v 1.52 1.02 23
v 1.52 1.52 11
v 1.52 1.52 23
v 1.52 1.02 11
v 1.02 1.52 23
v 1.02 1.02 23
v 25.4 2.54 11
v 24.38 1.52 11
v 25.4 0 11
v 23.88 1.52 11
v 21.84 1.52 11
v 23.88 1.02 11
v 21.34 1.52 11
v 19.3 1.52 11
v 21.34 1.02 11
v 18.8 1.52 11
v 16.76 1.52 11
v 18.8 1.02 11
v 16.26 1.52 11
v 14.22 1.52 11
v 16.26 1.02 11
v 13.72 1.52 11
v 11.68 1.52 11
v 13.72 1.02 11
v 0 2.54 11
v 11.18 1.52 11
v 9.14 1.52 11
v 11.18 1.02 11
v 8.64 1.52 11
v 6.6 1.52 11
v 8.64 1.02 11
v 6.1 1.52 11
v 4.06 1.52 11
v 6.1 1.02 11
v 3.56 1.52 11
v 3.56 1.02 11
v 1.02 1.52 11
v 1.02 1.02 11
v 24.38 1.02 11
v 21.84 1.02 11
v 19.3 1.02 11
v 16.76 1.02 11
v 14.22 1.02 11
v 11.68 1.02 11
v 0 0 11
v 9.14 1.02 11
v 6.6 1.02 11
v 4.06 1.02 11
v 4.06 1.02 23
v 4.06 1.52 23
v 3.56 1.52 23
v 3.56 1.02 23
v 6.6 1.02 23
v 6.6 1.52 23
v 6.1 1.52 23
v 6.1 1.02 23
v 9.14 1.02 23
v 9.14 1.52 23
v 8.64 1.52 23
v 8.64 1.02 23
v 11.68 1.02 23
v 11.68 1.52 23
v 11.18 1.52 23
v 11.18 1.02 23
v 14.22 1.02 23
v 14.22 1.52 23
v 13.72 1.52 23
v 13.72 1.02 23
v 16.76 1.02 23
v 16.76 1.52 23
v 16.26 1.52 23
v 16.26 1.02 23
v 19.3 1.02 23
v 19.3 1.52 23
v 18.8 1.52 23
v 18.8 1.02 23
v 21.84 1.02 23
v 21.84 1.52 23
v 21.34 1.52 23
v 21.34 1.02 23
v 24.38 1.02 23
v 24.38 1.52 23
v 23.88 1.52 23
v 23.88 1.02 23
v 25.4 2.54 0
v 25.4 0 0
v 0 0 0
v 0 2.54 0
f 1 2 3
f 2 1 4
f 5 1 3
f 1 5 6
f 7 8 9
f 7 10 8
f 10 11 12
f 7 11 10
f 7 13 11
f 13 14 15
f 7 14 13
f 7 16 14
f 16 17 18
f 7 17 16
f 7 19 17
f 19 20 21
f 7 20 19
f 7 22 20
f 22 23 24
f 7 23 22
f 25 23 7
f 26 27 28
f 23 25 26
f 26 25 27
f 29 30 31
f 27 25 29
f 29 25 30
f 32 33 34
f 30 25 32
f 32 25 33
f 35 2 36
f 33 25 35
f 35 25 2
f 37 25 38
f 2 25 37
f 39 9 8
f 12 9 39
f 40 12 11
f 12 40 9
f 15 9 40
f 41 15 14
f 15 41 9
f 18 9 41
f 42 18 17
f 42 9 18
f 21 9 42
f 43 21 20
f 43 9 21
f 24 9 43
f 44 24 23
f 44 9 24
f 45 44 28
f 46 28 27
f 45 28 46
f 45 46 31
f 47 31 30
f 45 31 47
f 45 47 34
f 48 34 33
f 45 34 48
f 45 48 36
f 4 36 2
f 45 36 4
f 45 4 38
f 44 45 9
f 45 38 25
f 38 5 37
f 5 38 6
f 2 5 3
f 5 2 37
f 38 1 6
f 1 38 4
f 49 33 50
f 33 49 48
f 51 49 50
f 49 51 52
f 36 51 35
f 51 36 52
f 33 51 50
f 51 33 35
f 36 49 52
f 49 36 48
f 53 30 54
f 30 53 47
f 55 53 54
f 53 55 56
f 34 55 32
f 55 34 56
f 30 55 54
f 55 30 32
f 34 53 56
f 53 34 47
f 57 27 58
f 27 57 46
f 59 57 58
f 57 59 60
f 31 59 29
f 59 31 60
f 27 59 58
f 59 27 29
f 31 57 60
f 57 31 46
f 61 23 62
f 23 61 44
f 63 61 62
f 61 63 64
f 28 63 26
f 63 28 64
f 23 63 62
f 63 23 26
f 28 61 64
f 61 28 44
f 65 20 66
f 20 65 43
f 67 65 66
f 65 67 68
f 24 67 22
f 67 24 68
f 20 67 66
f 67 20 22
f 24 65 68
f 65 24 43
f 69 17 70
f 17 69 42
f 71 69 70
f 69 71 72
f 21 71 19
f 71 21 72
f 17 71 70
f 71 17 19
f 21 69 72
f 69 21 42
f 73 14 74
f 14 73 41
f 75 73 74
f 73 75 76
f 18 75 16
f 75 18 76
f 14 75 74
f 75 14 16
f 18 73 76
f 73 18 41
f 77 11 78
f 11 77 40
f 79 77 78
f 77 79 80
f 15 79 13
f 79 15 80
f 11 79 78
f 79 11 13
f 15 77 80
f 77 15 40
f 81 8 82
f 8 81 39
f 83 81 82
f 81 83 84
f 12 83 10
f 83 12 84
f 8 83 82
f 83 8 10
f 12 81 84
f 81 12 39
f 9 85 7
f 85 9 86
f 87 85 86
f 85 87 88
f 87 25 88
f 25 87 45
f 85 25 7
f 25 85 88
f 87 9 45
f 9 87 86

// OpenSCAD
module Buchsenleiste(pins=10) {
    color("darkgrey") difference() {
        cube([pins * 2.54, 2.54, 11]);
        //for(i = [0:pins - 1]) translate([1.02 + i * 2.54, 1.02, -1]) cube([.5, .5, 10]);
    }
    color("gold") for(i = [0:pins - 1]) translate([1.02 + i * 2.54, 1.02, 11]) cube([.5, .5, 12]);
}

Buchsenleiste();
